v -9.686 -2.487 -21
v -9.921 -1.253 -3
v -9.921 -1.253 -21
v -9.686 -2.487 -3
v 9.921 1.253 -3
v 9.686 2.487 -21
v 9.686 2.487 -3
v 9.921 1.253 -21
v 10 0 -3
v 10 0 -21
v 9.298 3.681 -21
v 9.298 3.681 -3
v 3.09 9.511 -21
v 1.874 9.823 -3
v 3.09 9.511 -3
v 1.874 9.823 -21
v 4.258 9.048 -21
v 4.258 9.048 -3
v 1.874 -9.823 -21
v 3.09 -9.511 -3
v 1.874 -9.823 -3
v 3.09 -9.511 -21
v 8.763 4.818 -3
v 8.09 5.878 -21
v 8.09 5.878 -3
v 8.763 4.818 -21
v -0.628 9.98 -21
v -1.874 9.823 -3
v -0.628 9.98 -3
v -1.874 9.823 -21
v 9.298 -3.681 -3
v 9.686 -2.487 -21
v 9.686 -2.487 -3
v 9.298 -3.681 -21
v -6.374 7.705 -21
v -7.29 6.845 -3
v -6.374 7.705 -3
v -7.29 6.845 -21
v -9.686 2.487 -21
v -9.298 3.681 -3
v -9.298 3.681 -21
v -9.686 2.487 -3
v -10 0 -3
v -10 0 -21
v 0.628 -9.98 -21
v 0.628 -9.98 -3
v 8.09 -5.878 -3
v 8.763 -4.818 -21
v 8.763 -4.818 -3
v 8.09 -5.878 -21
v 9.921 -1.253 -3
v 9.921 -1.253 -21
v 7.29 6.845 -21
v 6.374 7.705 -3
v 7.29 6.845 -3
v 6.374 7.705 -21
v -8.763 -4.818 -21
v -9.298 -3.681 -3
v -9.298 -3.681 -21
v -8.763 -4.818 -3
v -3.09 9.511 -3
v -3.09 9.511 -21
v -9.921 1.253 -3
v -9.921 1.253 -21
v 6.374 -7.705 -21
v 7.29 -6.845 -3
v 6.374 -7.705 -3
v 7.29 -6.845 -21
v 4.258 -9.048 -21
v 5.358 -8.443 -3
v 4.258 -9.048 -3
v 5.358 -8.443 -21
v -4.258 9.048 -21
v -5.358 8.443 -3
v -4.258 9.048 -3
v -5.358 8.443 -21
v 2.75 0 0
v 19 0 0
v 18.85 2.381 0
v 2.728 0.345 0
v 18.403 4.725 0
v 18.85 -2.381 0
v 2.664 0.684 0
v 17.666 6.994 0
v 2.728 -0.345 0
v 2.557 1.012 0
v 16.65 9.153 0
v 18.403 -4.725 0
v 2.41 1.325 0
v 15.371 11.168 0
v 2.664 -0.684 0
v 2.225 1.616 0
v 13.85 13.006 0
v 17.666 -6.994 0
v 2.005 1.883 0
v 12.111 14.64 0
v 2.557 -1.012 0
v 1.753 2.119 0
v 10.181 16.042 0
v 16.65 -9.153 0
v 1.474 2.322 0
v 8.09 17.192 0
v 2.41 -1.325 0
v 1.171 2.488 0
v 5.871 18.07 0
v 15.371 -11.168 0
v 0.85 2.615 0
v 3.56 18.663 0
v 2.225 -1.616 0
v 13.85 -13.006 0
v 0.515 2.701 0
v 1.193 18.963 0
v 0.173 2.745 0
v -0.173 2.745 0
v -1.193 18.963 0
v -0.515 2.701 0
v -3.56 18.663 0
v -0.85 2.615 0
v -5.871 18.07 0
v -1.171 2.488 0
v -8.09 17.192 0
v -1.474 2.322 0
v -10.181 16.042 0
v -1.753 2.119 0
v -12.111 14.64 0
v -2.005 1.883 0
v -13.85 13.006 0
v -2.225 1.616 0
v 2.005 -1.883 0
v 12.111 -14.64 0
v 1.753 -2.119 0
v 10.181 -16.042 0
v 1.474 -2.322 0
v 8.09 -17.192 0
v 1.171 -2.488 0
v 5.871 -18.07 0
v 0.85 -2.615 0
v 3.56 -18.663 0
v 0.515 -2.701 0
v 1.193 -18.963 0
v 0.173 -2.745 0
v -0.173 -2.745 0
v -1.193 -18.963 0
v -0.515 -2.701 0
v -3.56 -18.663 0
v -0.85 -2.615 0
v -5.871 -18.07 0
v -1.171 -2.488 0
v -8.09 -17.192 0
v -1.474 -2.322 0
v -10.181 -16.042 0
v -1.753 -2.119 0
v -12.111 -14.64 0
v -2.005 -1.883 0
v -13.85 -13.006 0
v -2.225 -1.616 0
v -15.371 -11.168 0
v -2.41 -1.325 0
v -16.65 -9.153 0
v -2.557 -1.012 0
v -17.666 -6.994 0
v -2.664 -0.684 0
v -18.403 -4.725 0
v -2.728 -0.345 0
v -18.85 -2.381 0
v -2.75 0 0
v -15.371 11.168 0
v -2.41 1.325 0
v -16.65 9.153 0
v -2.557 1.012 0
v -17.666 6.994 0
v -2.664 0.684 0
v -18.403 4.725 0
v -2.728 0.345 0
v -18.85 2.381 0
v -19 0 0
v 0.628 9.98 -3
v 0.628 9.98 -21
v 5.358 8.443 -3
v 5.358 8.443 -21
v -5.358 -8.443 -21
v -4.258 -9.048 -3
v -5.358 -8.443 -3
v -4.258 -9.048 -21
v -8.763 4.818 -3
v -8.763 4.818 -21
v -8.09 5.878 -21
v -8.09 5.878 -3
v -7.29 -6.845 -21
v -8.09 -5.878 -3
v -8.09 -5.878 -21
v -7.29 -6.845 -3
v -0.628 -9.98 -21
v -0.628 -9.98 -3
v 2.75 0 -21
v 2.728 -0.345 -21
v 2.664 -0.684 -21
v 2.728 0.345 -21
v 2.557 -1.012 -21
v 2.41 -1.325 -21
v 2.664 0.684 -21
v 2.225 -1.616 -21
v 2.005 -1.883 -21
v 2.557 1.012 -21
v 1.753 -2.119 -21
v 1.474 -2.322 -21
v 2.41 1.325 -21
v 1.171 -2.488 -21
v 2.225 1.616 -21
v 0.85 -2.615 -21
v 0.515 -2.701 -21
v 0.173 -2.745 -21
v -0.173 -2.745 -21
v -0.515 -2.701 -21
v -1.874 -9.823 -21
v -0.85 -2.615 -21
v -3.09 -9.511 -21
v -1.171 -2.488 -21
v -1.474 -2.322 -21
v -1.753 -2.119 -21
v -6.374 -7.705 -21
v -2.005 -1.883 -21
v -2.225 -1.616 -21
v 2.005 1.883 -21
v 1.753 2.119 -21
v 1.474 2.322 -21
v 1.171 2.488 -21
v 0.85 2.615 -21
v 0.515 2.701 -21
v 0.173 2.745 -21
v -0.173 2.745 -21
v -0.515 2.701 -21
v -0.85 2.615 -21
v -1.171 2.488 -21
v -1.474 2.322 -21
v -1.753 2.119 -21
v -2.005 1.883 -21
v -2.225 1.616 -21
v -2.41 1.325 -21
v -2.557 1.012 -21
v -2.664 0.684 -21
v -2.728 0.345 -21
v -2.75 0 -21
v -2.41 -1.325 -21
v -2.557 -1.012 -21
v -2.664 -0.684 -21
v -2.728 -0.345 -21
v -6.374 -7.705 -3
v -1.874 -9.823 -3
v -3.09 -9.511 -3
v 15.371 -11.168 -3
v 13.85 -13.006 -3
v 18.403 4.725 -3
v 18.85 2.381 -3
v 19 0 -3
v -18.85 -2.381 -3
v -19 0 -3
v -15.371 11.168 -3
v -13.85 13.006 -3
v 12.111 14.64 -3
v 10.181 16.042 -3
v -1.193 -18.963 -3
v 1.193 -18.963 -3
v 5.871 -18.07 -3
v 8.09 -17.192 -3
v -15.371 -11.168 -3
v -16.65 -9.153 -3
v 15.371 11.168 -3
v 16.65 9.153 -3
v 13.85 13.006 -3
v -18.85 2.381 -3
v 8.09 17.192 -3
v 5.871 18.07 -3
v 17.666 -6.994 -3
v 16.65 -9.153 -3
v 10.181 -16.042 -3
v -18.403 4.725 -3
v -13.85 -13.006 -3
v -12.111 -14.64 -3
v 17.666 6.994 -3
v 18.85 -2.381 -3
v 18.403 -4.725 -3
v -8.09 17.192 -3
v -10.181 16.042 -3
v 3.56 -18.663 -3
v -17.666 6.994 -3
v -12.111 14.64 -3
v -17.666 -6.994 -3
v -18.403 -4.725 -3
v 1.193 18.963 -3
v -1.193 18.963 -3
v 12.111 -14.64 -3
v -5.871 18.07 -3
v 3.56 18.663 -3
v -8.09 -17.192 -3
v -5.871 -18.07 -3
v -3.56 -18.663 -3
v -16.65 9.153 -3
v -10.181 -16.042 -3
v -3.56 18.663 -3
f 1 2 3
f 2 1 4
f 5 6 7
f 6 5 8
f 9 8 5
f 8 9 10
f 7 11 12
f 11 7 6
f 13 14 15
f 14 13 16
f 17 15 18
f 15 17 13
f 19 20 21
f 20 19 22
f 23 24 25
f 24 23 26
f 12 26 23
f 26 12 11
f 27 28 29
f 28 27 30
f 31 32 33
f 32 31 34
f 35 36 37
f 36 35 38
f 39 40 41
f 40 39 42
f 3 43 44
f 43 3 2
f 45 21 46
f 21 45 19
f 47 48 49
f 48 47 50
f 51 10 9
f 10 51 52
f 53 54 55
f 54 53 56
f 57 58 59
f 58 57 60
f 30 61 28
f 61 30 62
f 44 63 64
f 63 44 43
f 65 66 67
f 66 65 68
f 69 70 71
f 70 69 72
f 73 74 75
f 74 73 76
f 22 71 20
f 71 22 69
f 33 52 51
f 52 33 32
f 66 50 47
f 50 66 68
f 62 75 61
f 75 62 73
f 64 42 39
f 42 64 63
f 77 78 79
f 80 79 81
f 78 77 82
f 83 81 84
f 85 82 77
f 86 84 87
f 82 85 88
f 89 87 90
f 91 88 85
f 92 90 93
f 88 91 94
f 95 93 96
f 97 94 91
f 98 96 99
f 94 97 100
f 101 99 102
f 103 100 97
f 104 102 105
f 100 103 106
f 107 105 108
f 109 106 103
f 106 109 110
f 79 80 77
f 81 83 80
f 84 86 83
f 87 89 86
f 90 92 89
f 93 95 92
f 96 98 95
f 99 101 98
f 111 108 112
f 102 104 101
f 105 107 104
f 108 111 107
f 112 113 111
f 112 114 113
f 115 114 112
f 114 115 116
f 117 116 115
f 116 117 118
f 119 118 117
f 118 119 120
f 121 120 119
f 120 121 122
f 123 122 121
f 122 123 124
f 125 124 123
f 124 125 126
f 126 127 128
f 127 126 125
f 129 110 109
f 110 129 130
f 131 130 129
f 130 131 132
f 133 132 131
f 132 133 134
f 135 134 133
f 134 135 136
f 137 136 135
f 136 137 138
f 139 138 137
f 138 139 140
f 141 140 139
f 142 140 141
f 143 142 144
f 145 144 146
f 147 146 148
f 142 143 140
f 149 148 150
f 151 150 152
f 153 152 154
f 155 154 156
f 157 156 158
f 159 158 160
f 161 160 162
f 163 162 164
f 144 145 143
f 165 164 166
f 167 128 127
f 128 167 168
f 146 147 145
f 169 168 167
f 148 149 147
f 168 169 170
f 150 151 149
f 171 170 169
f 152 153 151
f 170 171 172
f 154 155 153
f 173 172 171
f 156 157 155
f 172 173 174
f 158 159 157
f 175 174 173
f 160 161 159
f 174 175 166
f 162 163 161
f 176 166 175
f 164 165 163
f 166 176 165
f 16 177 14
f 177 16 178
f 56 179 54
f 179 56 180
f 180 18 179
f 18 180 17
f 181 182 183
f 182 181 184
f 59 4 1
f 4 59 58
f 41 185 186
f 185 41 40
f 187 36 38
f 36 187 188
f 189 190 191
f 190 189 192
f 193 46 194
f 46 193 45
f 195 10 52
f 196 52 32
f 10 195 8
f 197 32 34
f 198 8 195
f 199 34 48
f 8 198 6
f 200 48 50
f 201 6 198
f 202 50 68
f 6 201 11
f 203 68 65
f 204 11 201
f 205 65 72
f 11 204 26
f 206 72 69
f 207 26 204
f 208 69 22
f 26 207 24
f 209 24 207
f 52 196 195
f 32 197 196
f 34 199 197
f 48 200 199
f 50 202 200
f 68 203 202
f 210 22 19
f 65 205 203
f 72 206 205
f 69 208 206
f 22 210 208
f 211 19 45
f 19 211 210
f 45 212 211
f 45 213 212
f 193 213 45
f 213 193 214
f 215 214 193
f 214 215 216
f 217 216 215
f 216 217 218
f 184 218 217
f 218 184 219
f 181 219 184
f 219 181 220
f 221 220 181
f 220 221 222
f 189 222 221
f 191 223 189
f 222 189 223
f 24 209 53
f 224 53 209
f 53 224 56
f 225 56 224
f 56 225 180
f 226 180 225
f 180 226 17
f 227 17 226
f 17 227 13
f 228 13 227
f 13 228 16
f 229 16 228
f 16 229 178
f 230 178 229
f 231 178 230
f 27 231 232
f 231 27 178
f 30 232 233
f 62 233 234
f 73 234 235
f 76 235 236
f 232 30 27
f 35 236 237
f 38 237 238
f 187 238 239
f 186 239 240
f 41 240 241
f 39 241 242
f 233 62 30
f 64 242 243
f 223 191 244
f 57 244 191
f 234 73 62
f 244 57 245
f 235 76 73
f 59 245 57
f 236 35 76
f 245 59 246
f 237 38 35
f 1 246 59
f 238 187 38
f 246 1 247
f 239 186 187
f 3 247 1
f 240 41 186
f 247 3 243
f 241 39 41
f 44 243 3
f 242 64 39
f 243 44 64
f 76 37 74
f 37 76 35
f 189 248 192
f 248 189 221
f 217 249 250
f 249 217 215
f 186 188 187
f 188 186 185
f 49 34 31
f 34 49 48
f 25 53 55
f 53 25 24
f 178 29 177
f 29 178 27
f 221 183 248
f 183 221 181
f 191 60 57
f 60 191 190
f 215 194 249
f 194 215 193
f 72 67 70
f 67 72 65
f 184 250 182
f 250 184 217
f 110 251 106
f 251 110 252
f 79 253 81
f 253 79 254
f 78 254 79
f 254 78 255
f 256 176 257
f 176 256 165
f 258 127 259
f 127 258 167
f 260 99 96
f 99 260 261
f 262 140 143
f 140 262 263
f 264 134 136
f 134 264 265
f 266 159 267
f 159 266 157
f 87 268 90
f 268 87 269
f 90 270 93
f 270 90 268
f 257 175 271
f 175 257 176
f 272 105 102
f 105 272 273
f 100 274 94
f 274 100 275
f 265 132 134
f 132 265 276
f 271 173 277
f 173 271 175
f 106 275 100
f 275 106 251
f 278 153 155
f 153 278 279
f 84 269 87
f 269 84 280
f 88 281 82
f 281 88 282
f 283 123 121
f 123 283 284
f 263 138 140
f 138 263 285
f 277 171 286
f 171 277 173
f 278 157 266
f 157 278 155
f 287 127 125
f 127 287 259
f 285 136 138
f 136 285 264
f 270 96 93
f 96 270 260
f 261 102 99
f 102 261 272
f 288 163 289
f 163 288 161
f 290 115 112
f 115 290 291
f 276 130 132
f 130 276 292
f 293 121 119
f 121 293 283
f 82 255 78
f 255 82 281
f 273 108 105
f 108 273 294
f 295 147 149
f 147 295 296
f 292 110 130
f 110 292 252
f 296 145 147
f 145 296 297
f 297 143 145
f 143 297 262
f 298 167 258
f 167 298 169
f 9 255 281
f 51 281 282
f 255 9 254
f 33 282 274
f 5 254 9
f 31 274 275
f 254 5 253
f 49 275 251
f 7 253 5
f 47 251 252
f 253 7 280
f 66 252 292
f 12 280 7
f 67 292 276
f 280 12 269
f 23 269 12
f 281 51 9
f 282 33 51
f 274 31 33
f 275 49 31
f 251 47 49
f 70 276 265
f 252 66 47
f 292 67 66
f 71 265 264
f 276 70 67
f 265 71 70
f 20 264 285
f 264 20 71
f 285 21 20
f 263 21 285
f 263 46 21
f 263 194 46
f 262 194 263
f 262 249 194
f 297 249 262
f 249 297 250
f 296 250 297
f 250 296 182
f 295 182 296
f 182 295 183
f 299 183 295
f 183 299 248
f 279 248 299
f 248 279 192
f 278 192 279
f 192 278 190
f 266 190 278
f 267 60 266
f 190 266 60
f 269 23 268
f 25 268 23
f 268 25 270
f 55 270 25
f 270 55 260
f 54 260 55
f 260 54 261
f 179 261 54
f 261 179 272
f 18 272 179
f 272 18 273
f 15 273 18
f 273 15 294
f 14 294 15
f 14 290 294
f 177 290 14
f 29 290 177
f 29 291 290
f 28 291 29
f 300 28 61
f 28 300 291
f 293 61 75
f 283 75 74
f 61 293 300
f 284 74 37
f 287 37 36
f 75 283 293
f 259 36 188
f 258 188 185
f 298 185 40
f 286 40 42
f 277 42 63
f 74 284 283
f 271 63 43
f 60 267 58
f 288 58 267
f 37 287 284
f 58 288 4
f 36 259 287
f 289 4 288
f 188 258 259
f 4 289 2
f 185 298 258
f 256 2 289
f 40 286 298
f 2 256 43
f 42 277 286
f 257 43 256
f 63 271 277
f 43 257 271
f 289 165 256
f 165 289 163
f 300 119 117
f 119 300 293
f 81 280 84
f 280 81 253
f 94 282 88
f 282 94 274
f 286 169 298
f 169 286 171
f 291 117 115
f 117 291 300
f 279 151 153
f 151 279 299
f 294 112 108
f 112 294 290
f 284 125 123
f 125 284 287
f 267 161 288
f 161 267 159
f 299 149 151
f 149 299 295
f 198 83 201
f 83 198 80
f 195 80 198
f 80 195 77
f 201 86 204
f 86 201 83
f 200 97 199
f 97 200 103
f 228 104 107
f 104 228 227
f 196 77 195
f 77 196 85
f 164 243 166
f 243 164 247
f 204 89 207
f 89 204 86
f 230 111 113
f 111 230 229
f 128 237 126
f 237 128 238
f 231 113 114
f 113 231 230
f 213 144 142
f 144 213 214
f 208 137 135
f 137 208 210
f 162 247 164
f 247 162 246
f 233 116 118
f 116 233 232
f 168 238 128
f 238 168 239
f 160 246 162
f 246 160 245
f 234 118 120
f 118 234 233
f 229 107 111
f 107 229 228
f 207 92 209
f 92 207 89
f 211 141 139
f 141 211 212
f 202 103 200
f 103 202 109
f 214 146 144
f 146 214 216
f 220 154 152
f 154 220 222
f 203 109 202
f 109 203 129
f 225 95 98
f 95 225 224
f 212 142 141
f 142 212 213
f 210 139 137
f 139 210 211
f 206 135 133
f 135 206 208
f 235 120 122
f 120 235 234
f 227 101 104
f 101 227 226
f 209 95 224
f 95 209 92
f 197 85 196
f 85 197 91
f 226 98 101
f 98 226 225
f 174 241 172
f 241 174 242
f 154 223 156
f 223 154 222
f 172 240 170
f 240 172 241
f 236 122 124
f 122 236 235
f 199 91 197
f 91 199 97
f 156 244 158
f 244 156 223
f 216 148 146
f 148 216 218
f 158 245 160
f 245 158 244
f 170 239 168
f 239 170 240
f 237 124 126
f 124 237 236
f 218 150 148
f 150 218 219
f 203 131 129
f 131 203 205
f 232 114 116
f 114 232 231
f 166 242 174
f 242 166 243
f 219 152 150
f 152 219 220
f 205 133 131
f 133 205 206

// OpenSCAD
$fn = 50;


difference() {
	union() {
		translate(v = [0, 0, -21.0000000000]) {
			cylinder(h = 21, r = 10.0000000000);
		}
		translate(v = [0, 0, -3.0000000000]) {
			cylinder(h = 3, r = 19.0000000000);
		}
	}
	union() {
		#translate(v = [0, 0, -21]) {
			cylinder(h = 21, r = 2.7500000000);
		}
	}
}
